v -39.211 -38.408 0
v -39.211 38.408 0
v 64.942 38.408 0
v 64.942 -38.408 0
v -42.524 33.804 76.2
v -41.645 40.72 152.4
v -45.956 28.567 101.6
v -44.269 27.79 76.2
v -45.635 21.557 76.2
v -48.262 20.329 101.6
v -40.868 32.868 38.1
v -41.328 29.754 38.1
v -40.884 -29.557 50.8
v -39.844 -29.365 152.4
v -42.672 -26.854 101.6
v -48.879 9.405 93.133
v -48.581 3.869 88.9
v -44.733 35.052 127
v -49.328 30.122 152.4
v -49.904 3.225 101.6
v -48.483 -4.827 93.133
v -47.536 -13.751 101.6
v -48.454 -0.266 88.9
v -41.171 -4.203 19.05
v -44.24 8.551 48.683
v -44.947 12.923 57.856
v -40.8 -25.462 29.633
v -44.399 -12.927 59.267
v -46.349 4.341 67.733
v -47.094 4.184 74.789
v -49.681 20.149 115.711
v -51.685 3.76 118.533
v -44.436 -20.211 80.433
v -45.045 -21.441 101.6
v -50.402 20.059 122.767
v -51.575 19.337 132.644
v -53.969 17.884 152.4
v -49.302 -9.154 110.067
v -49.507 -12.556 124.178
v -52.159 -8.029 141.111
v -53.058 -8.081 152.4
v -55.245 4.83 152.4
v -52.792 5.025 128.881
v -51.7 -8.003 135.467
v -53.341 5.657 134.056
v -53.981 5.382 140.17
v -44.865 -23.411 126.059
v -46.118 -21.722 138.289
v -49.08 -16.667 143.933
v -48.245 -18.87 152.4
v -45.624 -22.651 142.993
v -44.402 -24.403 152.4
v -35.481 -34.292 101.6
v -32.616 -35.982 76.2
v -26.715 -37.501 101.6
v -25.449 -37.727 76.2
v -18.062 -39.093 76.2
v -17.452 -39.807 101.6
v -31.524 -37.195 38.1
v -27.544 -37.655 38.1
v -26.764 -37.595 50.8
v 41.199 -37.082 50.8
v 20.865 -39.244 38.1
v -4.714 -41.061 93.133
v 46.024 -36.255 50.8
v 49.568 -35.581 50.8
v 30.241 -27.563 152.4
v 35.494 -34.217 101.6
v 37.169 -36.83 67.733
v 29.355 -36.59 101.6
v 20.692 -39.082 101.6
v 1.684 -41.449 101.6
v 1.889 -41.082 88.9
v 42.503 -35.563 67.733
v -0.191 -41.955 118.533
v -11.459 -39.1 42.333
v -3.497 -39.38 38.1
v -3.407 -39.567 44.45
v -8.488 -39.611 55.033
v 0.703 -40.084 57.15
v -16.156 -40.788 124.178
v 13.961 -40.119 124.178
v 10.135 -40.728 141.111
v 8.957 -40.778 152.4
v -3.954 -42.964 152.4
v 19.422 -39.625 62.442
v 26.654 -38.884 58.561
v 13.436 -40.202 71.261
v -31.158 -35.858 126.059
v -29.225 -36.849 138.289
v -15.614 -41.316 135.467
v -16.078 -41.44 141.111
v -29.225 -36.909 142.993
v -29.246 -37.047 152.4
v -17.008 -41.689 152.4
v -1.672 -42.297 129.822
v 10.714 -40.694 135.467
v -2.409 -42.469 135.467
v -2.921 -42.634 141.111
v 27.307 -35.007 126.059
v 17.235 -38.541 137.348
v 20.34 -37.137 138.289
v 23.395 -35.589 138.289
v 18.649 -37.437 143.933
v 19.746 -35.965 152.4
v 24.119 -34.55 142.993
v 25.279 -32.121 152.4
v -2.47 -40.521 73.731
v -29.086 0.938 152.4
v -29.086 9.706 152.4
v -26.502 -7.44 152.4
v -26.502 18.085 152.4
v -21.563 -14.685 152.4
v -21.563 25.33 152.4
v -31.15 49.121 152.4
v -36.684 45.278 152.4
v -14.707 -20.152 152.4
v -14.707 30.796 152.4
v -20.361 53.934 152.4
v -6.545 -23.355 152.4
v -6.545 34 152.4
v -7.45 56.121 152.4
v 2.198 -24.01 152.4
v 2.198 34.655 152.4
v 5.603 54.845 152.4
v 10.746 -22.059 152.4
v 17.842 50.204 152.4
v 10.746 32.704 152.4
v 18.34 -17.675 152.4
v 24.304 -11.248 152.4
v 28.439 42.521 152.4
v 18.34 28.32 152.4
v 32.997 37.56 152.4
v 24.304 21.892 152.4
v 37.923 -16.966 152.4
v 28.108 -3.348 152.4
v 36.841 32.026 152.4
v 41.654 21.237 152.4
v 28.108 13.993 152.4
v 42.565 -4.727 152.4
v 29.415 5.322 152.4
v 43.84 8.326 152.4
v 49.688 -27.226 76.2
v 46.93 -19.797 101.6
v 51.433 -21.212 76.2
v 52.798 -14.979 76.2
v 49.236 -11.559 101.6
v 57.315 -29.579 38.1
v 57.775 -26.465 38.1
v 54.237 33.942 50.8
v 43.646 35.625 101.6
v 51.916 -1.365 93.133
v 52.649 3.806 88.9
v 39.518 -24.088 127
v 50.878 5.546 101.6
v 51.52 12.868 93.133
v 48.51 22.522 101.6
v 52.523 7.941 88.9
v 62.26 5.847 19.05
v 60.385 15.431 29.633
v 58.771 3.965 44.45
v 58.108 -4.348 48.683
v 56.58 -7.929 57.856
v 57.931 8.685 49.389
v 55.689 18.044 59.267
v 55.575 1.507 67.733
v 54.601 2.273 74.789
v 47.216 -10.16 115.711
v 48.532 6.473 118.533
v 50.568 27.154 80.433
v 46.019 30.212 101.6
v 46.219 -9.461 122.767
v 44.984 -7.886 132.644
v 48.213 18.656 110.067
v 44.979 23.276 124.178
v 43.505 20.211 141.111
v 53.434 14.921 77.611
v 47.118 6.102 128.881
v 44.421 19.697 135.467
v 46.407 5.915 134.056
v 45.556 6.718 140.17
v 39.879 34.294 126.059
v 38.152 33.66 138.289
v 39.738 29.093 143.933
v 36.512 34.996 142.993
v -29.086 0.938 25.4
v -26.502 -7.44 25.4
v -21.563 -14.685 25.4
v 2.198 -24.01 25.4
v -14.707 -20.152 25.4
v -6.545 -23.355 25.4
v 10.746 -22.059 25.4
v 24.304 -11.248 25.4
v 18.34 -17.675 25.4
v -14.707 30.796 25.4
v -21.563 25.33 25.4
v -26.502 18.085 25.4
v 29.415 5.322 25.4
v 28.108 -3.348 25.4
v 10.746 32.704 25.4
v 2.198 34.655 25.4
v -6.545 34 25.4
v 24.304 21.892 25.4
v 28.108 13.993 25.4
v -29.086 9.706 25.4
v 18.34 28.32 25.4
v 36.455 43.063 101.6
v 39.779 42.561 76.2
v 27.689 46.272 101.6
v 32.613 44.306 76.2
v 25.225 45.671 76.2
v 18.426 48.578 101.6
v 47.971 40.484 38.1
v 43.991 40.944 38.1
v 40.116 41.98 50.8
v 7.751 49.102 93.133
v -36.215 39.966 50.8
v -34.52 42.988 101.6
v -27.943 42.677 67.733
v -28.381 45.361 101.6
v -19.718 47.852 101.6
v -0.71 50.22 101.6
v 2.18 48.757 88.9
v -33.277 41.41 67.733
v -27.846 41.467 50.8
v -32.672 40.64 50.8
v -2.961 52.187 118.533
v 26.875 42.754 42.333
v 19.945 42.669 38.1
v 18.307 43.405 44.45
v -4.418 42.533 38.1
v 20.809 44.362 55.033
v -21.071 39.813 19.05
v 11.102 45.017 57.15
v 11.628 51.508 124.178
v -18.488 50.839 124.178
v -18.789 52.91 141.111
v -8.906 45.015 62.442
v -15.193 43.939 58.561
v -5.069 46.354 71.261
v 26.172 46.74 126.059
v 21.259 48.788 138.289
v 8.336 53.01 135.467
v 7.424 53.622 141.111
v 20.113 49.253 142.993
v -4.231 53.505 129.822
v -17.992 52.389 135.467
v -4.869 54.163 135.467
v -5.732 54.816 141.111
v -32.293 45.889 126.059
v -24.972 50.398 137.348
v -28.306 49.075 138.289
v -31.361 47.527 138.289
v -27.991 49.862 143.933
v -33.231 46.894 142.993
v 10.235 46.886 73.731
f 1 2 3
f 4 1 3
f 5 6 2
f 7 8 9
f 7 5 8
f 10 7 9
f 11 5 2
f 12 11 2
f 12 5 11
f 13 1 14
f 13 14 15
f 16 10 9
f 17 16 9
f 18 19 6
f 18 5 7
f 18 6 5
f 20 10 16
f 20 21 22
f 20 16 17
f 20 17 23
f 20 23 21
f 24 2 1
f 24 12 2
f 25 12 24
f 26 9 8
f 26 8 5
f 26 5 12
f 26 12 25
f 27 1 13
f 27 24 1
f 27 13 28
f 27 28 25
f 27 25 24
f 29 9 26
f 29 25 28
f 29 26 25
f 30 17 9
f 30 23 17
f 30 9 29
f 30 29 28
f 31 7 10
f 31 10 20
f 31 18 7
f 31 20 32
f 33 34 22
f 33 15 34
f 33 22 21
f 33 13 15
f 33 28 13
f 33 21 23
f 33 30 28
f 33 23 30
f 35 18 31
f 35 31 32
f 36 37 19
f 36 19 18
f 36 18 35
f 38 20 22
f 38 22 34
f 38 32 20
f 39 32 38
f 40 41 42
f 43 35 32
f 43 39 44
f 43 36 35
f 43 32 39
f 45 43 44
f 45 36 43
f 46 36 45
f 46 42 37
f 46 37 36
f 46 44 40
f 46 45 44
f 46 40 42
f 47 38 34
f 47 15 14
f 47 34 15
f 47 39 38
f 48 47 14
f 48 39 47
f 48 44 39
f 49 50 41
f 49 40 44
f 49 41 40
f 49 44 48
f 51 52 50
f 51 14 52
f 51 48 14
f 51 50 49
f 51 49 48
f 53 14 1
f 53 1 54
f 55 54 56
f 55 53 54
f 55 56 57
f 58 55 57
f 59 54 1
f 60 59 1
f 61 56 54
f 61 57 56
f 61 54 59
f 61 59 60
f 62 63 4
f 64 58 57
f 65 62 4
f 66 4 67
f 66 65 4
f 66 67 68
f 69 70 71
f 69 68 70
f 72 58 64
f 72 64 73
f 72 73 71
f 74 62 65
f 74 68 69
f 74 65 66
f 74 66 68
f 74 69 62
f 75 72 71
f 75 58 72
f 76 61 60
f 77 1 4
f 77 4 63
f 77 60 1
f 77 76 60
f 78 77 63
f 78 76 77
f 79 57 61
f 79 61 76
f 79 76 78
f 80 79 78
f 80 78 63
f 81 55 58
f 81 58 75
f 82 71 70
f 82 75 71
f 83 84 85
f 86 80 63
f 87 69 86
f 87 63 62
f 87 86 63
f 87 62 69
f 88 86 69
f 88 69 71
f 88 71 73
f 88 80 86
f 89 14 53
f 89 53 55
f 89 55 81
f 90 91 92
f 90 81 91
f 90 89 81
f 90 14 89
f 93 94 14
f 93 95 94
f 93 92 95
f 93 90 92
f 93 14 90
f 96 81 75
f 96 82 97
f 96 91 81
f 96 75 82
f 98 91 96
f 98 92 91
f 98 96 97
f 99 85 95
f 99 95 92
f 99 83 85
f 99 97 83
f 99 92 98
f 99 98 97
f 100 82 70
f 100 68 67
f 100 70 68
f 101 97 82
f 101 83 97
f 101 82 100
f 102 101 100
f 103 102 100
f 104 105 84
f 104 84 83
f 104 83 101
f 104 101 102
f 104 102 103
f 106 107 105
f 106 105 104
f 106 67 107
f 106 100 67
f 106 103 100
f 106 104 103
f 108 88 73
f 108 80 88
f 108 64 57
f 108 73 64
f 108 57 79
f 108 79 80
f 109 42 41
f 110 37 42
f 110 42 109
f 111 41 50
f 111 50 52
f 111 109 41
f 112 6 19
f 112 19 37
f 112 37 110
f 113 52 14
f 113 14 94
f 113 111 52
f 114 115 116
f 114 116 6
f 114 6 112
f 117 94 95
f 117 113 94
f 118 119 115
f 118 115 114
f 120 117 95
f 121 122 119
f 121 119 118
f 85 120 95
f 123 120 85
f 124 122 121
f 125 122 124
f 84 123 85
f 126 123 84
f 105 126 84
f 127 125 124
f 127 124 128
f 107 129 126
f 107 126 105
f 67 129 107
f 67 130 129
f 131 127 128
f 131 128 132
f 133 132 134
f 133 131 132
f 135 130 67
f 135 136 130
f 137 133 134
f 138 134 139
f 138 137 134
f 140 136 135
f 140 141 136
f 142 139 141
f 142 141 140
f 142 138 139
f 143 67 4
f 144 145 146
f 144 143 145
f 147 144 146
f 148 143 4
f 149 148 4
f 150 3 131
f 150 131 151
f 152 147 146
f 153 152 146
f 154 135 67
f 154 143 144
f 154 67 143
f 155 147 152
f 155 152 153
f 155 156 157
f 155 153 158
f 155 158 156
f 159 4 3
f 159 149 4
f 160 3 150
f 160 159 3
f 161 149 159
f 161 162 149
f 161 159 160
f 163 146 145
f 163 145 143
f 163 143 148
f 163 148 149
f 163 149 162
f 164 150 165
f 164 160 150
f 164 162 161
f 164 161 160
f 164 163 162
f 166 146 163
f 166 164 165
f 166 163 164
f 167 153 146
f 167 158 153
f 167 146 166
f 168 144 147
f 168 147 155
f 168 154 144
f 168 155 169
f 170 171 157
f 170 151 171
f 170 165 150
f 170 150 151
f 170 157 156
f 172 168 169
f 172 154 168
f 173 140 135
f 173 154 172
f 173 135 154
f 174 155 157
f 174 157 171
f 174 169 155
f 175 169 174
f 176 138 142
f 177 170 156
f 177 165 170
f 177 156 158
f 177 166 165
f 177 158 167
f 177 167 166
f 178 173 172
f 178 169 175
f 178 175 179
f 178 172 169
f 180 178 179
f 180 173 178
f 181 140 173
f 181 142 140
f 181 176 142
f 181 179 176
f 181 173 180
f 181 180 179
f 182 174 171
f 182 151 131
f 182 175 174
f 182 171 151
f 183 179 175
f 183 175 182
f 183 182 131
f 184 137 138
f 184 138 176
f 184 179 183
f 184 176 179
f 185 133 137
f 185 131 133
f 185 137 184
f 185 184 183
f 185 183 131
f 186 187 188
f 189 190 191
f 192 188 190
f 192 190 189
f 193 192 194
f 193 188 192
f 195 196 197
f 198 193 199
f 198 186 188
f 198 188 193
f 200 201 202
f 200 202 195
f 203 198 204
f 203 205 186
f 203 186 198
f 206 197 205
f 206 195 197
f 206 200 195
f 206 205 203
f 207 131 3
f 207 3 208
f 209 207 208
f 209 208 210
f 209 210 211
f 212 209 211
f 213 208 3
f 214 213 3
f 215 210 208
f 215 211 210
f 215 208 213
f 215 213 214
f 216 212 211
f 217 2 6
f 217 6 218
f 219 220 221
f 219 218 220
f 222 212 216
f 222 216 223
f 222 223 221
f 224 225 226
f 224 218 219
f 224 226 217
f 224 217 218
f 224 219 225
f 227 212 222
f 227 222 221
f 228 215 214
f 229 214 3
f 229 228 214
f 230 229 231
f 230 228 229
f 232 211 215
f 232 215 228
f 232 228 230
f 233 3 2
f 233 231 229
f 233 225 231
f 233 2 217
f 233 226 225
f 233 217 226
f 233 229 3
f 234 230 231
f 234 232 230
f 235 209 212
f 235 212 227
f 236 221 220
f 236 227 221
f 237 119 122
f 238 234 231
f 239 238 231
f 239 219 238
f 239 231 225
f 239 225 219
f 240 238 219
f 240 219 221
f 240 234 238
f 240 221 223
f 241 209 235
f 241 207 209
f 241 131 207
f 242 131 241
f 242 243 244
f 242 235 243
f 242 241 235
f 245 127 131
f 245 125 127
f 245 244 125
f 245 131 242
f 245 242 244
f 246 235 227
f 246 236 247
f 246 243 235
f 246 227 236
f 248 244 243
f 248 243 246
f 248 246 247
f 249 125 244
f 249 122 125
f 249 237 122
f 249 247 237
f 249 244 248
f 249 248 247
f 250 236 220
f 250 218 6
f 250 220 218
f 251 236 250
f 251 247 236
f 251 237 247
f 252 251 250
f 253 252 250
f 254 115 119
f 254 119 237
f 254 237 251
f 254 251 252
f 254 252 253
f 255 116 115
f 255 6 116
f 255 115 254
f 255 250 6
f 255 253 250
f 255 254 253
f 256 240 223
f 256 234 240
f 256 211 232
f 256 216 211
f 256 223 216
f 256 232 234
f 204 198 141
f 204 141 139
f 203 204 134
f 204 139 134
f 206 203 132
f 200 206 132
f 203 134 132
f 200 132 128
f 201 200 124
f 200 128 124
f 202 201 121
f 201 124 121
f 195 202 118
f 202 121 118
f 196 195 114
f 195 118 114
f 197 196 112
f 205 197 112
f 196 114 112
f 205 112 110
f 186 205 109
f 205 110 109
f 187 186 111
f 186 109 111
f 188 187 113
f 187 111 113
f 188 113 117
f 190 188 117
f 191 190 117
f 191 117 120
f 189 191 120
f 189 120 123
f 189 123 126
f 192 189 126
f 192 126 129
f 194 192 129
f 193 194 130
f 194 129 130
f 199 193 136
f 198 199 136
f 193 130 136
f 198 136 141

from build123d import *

# Parameters (mm, degrees)
F0_W     = 104.1534732964
F0_H     = 76.8153294921
F4_R     = 29.4148902483
F5_DEPTH = 127


# Not quite as in the source:
# - the arcs of a loft's sections are written as splines that run evenly, so that the points pair up as in the source's solid


with BuildPart() as f3:
    # F0 (on Top) → F3 section 0
    with BuildSketch(Plane.XY):
        with Locations((12.8655565871, 0)):
            Rectangle(F0_W, F0_H)
    # F2 (on offset) → F3 section 1
    with BuildSketch(Plane.XY.offset(152.4)):
        with BuildLine():
            add(Edge.make_bspline(
                [(-41.6450555416, 40.7195541248), (-43.8796016064, 38.3671029534), (-45.8824019296, 35.7946318153), (-49.3477407941, 30.3082562291), (-50.810193648, 27.3944874425), (-53.1386082181, 21.3374769498), (-54.0045123596, 18.1943850152), (-55.1065229691, 11.7995071325), (-55.3426021877, 8.5478793103), (-55.175859187, 2.0608856083), (-54.7730410907, -1.1743198678), (-53.3439523197, -7.5041378591), (-52.3177169821, -10.5985938571), (-49.6812015209, -16.5279847821), (-48.0709865904, -19.3627730932), (-44.3283642496, -24.6638737839), (-42.196049383, -27.1300550832), (-39.8435982116, -29.3646011481)],
                knots=[0, 0, 0, 0, 0.125, 0.125, 0.25, 0.25, 0.375, 0.375, 0.5, 0.5, 0.625, 0.625, 0.75, 0.75, 0.875, 0.875, 1, 1, 1, 1], degree=3))
            add(Edge.make_bspline(
                [(-39.8435982116, -29.3646011481), (-37.4911470402, -31.5991472129), (-34.9186759021, -33.6019475362), (-29.4323003159, -37.0672864006), (-26.5185315293, -38.5297392545), (-20.4615210366, -40.8581538246), (-17.318429102, -41.7240579661), (-10.9235512193, -42.8260685756), (-7.6719233971, -43.0621477942), (-1.1849296951, -42.8954047935), (2.050275781, -42.4925866972), (8.3800937724, -41.0634979262), (11.4745497703, -40.0372625886), (17.4039406953, -37.4007471274), (20.2387290065, -35.7905321969), (25.5398296971, -32.0479098561), (28.0060109965, -29.9155949895), (30.2405570613, -27.5631438181)],
                knots=[0, 0, 0, 0, 0.125, 0.125, 0.25, 0.25, 0.375, 0.375, 0.5, 0.5, 0.625, 0.625, 0.75, 0.75, 0.875, 0.875, 1, 1, 1, 1], degree=3))
            add(Edge.make_bspline(
                [(30.2405570613, -27.5631438181), (32.4751031261, -25.2106926468), (34.4779034494, -22.6382215086), (37.9432423138, -17.1518459224), (39.4056951677, -14.2380771358), (41.7341097378, -8.1810666431), (42.6000138793, -5.0379747085), (43.7020244888, 1.3569031742), (43.9381037074, 4.6085309964), (43.7713607067, 11.0955246984), (43.3685426104, 14.3307301745), (41.9394538394, 20.6605481658), (40.9132185018, 23.7550041638), (38.2767030406, 29.6843950888), (36.6664881101, 32.5191833999), (32.9238657693, 37.8202840906), (30.7915509027, 40.2864653899), (28.4390997313, 42.5210114548)],
                knots=[0, 0, 0, 0, 0.125, 0.125, 0.25, 0.25, 0.375, 0.375, 0.5, 0.5, 0.625, 0.625, 0.75, 0.75, 0.875, 0.875, 1, 1, 1, 1], degree=3))
            add(Edge.make_bspline(
                [(28.4390997313, 42.5210114548), (26.08664856, 44.7555575196), (23.5141774218, 46.7583578429), (18.0278018356, 50.2236967073), (15.114033049, 51.6861495612), (9.0570225563, 54.0145641313), (5.9139306218, 54.8804682728), (-0.480947261, 55.9824788823), (-3.7325750832, 56.2185581009), (-10.2195687852, 56.0518151002), (-13.4547742613, 55.6489970039), (-19.7845922526, 54.2199082329), (-22.8790482506, 53.1936728953), (-28.8084391756, 50.5571574341), (-31.6432274867, 48.9469425036), (-36.9443281774, 45.2043201628), (-39.4105094767, 43.0720052962), (-41.6450555416, 40.7195541248)],
                knots=[0, 0, 0, 0, 0.125, 0.125, 0.25, 0.25, 0.375, 0.375, 0.5, 0.5, 0.625, 0.625, 0.75, 0.75, 0.875, 0.875, 1, 1, 1, 1], degree=3))
        make_face()
    loft(ruled=True)

    # F4 (on face) → F5 (cut)
    with BuildSketch(Plane.XY.offset(152.4)):
        with Locations((0, 5.3224205039)):
            Circle(F4_R)
    extrude(amount=-F5_DEPTH, mode=Mode.SUBTRACT)


solid = f3.part
